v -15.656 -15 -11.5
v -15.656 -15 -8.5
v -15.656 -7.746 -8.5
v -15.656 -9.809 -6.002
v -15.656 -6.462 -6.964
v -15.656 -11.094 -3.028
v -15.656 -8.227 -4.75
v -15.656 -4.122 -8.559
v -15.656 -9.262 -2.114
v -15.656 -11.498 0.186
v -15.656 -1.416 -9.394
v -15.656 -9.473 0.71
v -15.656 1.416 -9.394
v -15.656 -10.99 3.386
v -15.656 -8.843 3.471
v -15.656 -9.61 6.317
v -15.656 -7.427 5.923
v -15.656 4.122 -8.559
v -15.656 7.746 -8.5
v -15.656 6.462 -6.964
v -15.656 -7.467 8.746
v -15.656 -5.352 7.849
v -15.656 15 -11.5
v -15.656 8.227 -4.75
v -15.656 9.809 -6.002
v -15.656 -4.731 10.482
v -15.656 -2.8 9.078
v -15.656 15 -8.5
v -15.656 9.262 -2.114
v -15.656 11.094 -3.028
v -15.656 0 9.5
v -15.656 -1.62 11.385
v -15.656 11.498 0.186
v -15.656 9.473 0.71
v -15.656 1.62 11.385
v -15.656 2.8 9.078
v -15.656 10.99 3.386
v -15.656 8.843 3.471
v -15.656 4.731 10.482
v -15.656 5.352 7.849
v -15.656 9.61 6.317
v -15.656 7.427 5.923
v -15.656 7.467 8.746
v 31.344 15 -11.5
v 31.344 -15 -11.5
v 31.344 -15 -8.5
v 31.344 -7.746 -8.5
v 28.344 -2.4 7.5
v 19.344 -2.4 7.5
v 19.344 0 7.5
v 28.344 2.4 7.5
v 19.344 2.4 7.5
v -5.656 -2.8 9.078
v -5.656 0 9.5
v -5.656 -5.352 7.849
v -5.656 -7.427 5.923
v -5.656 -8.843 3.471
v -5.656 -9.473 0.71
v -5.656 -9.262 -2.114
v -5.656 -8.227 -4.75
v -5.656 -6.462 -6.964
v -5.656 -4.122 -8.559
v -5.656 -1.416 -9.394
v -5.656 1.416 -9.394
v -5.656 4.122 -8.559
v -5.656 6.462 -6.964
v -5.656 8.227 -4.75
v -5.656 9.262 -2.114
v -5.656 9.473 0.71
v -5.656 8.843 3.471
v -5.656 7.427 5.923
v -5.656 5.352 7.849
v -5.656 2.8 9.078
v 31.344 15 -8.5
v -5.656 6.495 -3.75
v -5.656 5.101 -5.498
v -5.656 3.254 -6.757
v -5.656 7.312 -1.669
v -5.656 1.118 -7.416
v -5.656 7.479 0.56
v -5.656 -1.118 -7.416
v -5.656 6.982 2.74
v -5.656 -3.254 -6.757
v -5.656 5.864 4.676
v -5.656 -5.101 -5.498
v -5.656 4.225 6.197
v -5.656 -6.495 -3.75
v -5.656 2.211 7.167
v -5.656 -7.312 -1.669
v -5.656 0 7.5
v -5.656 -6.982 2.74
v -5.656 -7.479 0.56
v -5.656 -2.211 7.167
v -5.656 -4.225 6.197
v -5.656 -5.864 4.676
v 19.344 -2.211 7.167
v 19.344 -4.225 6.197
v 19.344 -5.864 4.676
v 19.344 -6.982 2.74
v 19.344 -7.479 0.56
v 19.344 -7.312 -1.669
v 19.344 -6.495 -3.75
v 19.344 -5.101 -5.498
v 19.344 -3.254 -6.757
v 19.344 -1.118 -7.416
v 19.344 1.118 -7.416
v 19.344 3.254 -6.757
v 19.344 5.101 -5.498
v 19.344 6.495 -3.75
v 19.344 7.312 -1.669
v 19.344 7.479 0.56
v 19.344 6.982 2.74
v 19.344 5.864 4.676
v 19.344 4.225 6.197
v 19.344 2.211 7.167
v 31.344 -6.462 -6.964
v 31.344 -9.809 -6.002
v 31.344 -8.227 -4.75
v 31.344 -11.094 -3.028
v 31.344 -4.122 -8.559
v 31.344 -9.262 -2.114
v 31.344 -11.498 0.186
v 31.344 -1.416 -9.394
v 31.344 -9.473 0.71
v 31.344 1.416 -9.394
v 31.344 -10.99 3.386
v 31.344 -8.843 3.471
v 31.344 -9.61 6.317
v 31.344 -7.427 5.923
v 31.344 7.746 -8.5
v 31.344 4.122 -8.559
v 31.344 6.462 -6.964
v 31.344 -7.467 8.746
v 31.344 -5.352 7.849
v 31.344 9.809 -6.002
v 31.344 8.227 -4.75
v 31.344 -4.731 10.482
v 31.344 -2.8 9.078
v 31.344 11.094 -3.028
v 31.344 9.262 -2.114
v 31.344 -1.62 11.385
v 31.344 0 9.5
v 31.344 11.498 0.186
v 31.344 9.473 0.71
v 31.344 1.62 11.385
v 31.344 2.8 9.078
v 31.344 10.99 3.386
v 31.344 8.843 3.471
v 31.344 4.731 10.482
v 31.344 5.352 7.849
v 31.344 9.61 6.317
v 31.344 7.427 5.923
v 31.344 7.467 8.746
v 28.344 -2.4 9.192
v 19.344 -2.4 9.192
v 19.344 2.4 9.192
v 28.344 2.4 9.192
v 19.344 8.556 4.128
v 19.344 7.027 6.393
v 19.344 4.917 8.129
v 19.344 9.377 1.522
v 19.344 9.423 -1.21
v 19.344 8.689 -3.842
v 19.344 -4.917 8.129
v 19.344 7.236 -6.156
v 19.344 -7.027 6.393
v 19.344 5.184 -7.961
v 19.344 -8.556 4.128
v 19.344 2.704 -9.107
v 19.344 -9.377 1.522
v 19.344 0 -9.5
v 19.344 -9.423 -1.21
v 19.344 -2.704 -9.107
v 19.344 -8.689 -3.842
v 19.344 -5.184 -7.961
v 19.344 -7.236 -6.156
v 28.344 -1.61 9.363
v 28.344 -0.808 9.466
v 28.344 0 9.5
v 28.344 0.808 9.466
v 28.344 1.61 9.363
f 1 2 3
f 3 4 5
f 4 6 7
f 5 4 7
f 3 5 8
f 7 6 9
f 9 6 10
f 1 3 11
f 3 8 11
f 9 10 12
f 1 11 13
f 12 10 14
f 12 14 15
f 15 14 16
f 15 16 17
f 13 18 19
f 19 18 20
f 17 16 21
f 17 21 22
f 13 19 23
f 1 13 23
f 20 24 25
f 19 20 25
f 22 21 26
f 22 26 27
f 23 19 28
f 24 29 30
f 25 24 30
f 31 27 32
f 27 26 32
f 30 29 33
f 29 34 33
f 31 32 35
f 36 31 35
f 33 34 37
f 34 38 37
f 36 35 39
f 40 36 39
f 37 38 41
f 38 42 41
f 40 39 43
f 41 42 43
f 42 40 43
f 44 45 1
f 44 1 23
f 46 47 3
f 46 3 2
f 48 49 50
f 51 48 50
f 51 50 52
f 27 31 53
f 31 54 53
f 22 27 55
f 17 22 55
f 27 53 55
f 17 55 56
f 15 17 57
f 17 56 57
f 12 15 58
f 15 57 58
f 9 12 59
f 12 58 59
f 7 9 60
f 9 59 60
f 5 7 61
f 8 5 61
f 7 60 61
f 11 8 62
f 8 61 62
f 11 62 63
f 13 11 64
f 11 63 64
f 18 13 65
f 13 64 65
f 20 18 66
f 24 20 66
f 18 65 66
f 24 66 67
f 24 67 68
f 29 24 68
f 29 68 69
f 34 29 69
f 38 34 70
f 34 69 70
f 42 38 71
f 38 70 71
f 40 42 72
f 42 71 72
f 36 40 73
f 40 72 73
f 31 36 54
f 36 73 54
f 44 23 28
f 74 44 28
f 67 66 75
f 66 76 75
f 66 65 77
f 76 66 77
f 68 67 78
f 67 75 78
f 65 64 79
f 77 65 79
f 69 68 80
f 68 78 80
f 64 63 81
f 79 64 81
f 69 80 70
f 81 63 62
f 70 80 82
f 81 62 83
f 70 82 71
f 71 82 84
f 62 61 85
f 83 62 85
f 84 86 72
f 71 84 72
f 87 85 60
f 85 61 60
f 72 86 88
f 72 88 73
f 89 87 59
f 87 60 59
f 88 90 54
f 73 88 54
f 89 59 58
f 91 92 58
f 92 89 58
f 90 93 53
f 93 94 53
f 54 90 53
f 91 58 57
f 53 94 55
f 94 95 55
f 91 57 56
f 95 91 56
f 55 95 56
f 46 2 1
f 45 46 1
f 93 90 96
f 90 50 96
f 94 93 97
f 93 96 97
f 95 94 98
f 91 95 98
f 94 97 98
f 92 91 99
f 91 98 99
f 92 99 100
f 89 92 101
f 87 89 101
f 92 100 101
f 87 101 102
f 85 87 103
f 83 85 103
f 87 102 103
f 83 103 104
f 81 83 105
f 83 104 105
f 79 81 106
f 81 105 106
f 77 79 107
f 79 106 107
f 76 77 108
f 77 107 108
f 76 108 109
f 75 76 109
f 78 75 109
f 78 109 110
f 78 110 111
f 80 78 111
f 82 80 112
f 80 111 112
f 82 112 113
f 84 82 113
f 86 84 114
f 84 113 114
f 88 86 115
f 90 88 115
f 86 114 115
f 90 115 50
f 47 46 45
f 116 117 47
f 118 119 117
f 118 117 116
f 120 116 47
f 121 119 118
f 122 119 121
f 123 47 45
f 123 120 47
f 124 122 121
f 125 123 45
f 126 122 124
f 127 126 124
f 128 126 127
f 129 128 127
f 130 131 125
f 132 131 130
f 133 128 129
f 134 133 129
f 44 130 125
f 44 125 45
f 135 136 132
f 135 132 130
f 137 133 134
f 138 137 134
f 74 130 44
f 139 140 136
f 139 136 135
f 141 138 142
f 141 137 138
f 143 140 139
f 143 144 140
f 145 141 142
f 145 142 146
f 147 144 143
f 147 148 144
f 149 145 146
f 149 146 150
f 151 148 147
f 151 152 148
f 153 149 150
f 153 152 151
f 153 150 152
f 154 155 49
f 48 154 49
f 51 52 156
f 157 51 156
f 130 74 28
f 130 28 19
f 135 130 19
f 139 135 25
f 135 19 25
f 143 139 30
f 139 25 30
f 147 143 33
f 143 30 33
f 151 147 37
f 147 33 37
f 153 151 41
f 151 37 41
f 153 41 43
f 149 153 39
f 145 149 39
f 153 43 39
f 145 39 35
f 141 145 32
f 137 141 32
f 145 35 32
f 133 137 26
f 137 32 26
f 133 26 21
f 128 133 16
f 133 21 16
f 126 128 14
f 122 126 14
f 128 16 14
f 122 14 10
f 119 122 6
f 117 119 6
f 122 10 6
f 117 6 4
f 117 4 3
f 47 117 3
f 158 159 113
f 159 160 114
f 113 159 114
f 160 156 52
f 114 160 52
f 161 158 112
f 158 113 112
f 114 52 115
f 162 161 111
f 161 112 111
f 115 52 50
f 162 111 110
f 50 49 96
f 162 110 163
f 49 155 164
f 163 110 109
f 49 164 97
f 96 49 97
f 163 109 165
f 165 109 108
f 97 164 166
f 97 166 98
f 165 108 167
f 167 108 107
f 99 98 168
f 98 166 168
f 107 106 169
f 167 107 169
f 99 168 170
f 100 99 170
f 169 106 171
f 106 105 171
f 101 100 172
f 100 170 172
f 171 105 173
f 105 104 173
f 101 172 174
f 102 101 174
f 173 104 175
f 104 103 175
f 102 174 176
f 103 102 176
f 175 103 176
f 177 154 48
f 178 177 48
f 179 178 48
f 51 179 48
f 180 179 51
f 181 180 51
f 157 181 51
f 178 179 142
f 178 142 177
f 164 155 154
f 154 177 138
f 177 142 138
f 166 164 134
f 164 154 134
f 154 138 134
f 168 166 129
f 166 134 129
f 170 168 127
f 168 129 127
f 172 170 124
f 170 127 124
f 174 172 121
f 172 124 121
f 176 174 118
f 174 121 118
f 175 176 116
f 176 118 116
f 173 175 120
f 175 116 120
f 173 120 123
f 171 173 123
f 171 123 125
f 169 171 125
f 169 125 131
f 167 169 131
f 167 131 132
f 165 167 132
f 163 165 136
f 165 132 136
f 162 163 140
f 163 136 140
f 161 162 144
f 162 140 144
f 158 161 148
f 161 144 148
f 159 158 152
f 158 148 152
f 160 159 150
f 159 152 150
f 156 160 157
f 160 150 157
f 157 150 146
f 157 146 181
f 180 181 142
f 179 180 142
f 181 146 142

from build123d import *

# Parameters (mm, degrees)
F3_DEPTH = 9
F5_DEPTH = 47


with BuildPart() as f1:
    # F0 (on Front) → F1 (revolve)
    with BuildSketch(Plane.XZ):
        Polygon((-5.6564239193, 9.5), (-5.6564239193, 7.5), (19.3435760807, 7.5), (19.3435760807, 9.5), (31.3435760807, 9.5), (31.3435760807, 11.5), (-15.6564239193, 11.5), (-15.6564239193, 9.5), align=None)
    revolve(axis=Axis((2.8128489057, 0, 0), (1, 0, 0)))

    # F2 (on face) → F3 (join)
    with BuildSketch(Plane.YZ.offset(19.3435760807)):
        with BuildLine():
            Line((0, 7.5), (0, 9.5))
            ThreePointArc((0, 9.5), (-1.2098512295, 9.4226461253), (-2.4, 9.191844211))
            Line((-2.4, 9.191844211), (-2.4, 7.5))
            Line((-2.4, 7.5), (0, 7.5))
        make_face()
        with BuildLine():
            ThreePointArc((2.4, 9.191844211), (1.2098512295, 9.4226461253), (0, 9.5))
            Line((0, 9.5), (0, 7.5))
            Line((0, 7.5), (2.4, 7.5))
            Line((2.4, 7.5), (2.4, 9.191844211))
        make_face()
    extrude(amount=F3_DEPTH)

    # F4 (on face) → F5 (join, through all)
    with BuildSketch(Plane.YZ.offset(31.3435760807)):
        with BuildLine():
            Line((-15, -11.5), (0, -11.5))
            ThreePointArc((0, -11.5), (-4.1533119315, -10.7238052948), (-7.7459666924, -8.5))
            Line((-7.7459666924, -8.5), (-15, -8.5))
            Line((-15, -8.5), (-15, -11.5))
        make_face()
        with BuildLine():
            ThreePointArc((7.7459666924, -8.5), (4.1533119315, -10.7238052948), (0, -11.5))
            Line((0, -11.5), (15, -11.5))
            Line((15, -11.5), (15, -8.5))
            Line((15, -8.5), (7.7459666924, -8.5))
        make_face()
    extrude(amount=-F5_DEPTH)


solid = f1.part
